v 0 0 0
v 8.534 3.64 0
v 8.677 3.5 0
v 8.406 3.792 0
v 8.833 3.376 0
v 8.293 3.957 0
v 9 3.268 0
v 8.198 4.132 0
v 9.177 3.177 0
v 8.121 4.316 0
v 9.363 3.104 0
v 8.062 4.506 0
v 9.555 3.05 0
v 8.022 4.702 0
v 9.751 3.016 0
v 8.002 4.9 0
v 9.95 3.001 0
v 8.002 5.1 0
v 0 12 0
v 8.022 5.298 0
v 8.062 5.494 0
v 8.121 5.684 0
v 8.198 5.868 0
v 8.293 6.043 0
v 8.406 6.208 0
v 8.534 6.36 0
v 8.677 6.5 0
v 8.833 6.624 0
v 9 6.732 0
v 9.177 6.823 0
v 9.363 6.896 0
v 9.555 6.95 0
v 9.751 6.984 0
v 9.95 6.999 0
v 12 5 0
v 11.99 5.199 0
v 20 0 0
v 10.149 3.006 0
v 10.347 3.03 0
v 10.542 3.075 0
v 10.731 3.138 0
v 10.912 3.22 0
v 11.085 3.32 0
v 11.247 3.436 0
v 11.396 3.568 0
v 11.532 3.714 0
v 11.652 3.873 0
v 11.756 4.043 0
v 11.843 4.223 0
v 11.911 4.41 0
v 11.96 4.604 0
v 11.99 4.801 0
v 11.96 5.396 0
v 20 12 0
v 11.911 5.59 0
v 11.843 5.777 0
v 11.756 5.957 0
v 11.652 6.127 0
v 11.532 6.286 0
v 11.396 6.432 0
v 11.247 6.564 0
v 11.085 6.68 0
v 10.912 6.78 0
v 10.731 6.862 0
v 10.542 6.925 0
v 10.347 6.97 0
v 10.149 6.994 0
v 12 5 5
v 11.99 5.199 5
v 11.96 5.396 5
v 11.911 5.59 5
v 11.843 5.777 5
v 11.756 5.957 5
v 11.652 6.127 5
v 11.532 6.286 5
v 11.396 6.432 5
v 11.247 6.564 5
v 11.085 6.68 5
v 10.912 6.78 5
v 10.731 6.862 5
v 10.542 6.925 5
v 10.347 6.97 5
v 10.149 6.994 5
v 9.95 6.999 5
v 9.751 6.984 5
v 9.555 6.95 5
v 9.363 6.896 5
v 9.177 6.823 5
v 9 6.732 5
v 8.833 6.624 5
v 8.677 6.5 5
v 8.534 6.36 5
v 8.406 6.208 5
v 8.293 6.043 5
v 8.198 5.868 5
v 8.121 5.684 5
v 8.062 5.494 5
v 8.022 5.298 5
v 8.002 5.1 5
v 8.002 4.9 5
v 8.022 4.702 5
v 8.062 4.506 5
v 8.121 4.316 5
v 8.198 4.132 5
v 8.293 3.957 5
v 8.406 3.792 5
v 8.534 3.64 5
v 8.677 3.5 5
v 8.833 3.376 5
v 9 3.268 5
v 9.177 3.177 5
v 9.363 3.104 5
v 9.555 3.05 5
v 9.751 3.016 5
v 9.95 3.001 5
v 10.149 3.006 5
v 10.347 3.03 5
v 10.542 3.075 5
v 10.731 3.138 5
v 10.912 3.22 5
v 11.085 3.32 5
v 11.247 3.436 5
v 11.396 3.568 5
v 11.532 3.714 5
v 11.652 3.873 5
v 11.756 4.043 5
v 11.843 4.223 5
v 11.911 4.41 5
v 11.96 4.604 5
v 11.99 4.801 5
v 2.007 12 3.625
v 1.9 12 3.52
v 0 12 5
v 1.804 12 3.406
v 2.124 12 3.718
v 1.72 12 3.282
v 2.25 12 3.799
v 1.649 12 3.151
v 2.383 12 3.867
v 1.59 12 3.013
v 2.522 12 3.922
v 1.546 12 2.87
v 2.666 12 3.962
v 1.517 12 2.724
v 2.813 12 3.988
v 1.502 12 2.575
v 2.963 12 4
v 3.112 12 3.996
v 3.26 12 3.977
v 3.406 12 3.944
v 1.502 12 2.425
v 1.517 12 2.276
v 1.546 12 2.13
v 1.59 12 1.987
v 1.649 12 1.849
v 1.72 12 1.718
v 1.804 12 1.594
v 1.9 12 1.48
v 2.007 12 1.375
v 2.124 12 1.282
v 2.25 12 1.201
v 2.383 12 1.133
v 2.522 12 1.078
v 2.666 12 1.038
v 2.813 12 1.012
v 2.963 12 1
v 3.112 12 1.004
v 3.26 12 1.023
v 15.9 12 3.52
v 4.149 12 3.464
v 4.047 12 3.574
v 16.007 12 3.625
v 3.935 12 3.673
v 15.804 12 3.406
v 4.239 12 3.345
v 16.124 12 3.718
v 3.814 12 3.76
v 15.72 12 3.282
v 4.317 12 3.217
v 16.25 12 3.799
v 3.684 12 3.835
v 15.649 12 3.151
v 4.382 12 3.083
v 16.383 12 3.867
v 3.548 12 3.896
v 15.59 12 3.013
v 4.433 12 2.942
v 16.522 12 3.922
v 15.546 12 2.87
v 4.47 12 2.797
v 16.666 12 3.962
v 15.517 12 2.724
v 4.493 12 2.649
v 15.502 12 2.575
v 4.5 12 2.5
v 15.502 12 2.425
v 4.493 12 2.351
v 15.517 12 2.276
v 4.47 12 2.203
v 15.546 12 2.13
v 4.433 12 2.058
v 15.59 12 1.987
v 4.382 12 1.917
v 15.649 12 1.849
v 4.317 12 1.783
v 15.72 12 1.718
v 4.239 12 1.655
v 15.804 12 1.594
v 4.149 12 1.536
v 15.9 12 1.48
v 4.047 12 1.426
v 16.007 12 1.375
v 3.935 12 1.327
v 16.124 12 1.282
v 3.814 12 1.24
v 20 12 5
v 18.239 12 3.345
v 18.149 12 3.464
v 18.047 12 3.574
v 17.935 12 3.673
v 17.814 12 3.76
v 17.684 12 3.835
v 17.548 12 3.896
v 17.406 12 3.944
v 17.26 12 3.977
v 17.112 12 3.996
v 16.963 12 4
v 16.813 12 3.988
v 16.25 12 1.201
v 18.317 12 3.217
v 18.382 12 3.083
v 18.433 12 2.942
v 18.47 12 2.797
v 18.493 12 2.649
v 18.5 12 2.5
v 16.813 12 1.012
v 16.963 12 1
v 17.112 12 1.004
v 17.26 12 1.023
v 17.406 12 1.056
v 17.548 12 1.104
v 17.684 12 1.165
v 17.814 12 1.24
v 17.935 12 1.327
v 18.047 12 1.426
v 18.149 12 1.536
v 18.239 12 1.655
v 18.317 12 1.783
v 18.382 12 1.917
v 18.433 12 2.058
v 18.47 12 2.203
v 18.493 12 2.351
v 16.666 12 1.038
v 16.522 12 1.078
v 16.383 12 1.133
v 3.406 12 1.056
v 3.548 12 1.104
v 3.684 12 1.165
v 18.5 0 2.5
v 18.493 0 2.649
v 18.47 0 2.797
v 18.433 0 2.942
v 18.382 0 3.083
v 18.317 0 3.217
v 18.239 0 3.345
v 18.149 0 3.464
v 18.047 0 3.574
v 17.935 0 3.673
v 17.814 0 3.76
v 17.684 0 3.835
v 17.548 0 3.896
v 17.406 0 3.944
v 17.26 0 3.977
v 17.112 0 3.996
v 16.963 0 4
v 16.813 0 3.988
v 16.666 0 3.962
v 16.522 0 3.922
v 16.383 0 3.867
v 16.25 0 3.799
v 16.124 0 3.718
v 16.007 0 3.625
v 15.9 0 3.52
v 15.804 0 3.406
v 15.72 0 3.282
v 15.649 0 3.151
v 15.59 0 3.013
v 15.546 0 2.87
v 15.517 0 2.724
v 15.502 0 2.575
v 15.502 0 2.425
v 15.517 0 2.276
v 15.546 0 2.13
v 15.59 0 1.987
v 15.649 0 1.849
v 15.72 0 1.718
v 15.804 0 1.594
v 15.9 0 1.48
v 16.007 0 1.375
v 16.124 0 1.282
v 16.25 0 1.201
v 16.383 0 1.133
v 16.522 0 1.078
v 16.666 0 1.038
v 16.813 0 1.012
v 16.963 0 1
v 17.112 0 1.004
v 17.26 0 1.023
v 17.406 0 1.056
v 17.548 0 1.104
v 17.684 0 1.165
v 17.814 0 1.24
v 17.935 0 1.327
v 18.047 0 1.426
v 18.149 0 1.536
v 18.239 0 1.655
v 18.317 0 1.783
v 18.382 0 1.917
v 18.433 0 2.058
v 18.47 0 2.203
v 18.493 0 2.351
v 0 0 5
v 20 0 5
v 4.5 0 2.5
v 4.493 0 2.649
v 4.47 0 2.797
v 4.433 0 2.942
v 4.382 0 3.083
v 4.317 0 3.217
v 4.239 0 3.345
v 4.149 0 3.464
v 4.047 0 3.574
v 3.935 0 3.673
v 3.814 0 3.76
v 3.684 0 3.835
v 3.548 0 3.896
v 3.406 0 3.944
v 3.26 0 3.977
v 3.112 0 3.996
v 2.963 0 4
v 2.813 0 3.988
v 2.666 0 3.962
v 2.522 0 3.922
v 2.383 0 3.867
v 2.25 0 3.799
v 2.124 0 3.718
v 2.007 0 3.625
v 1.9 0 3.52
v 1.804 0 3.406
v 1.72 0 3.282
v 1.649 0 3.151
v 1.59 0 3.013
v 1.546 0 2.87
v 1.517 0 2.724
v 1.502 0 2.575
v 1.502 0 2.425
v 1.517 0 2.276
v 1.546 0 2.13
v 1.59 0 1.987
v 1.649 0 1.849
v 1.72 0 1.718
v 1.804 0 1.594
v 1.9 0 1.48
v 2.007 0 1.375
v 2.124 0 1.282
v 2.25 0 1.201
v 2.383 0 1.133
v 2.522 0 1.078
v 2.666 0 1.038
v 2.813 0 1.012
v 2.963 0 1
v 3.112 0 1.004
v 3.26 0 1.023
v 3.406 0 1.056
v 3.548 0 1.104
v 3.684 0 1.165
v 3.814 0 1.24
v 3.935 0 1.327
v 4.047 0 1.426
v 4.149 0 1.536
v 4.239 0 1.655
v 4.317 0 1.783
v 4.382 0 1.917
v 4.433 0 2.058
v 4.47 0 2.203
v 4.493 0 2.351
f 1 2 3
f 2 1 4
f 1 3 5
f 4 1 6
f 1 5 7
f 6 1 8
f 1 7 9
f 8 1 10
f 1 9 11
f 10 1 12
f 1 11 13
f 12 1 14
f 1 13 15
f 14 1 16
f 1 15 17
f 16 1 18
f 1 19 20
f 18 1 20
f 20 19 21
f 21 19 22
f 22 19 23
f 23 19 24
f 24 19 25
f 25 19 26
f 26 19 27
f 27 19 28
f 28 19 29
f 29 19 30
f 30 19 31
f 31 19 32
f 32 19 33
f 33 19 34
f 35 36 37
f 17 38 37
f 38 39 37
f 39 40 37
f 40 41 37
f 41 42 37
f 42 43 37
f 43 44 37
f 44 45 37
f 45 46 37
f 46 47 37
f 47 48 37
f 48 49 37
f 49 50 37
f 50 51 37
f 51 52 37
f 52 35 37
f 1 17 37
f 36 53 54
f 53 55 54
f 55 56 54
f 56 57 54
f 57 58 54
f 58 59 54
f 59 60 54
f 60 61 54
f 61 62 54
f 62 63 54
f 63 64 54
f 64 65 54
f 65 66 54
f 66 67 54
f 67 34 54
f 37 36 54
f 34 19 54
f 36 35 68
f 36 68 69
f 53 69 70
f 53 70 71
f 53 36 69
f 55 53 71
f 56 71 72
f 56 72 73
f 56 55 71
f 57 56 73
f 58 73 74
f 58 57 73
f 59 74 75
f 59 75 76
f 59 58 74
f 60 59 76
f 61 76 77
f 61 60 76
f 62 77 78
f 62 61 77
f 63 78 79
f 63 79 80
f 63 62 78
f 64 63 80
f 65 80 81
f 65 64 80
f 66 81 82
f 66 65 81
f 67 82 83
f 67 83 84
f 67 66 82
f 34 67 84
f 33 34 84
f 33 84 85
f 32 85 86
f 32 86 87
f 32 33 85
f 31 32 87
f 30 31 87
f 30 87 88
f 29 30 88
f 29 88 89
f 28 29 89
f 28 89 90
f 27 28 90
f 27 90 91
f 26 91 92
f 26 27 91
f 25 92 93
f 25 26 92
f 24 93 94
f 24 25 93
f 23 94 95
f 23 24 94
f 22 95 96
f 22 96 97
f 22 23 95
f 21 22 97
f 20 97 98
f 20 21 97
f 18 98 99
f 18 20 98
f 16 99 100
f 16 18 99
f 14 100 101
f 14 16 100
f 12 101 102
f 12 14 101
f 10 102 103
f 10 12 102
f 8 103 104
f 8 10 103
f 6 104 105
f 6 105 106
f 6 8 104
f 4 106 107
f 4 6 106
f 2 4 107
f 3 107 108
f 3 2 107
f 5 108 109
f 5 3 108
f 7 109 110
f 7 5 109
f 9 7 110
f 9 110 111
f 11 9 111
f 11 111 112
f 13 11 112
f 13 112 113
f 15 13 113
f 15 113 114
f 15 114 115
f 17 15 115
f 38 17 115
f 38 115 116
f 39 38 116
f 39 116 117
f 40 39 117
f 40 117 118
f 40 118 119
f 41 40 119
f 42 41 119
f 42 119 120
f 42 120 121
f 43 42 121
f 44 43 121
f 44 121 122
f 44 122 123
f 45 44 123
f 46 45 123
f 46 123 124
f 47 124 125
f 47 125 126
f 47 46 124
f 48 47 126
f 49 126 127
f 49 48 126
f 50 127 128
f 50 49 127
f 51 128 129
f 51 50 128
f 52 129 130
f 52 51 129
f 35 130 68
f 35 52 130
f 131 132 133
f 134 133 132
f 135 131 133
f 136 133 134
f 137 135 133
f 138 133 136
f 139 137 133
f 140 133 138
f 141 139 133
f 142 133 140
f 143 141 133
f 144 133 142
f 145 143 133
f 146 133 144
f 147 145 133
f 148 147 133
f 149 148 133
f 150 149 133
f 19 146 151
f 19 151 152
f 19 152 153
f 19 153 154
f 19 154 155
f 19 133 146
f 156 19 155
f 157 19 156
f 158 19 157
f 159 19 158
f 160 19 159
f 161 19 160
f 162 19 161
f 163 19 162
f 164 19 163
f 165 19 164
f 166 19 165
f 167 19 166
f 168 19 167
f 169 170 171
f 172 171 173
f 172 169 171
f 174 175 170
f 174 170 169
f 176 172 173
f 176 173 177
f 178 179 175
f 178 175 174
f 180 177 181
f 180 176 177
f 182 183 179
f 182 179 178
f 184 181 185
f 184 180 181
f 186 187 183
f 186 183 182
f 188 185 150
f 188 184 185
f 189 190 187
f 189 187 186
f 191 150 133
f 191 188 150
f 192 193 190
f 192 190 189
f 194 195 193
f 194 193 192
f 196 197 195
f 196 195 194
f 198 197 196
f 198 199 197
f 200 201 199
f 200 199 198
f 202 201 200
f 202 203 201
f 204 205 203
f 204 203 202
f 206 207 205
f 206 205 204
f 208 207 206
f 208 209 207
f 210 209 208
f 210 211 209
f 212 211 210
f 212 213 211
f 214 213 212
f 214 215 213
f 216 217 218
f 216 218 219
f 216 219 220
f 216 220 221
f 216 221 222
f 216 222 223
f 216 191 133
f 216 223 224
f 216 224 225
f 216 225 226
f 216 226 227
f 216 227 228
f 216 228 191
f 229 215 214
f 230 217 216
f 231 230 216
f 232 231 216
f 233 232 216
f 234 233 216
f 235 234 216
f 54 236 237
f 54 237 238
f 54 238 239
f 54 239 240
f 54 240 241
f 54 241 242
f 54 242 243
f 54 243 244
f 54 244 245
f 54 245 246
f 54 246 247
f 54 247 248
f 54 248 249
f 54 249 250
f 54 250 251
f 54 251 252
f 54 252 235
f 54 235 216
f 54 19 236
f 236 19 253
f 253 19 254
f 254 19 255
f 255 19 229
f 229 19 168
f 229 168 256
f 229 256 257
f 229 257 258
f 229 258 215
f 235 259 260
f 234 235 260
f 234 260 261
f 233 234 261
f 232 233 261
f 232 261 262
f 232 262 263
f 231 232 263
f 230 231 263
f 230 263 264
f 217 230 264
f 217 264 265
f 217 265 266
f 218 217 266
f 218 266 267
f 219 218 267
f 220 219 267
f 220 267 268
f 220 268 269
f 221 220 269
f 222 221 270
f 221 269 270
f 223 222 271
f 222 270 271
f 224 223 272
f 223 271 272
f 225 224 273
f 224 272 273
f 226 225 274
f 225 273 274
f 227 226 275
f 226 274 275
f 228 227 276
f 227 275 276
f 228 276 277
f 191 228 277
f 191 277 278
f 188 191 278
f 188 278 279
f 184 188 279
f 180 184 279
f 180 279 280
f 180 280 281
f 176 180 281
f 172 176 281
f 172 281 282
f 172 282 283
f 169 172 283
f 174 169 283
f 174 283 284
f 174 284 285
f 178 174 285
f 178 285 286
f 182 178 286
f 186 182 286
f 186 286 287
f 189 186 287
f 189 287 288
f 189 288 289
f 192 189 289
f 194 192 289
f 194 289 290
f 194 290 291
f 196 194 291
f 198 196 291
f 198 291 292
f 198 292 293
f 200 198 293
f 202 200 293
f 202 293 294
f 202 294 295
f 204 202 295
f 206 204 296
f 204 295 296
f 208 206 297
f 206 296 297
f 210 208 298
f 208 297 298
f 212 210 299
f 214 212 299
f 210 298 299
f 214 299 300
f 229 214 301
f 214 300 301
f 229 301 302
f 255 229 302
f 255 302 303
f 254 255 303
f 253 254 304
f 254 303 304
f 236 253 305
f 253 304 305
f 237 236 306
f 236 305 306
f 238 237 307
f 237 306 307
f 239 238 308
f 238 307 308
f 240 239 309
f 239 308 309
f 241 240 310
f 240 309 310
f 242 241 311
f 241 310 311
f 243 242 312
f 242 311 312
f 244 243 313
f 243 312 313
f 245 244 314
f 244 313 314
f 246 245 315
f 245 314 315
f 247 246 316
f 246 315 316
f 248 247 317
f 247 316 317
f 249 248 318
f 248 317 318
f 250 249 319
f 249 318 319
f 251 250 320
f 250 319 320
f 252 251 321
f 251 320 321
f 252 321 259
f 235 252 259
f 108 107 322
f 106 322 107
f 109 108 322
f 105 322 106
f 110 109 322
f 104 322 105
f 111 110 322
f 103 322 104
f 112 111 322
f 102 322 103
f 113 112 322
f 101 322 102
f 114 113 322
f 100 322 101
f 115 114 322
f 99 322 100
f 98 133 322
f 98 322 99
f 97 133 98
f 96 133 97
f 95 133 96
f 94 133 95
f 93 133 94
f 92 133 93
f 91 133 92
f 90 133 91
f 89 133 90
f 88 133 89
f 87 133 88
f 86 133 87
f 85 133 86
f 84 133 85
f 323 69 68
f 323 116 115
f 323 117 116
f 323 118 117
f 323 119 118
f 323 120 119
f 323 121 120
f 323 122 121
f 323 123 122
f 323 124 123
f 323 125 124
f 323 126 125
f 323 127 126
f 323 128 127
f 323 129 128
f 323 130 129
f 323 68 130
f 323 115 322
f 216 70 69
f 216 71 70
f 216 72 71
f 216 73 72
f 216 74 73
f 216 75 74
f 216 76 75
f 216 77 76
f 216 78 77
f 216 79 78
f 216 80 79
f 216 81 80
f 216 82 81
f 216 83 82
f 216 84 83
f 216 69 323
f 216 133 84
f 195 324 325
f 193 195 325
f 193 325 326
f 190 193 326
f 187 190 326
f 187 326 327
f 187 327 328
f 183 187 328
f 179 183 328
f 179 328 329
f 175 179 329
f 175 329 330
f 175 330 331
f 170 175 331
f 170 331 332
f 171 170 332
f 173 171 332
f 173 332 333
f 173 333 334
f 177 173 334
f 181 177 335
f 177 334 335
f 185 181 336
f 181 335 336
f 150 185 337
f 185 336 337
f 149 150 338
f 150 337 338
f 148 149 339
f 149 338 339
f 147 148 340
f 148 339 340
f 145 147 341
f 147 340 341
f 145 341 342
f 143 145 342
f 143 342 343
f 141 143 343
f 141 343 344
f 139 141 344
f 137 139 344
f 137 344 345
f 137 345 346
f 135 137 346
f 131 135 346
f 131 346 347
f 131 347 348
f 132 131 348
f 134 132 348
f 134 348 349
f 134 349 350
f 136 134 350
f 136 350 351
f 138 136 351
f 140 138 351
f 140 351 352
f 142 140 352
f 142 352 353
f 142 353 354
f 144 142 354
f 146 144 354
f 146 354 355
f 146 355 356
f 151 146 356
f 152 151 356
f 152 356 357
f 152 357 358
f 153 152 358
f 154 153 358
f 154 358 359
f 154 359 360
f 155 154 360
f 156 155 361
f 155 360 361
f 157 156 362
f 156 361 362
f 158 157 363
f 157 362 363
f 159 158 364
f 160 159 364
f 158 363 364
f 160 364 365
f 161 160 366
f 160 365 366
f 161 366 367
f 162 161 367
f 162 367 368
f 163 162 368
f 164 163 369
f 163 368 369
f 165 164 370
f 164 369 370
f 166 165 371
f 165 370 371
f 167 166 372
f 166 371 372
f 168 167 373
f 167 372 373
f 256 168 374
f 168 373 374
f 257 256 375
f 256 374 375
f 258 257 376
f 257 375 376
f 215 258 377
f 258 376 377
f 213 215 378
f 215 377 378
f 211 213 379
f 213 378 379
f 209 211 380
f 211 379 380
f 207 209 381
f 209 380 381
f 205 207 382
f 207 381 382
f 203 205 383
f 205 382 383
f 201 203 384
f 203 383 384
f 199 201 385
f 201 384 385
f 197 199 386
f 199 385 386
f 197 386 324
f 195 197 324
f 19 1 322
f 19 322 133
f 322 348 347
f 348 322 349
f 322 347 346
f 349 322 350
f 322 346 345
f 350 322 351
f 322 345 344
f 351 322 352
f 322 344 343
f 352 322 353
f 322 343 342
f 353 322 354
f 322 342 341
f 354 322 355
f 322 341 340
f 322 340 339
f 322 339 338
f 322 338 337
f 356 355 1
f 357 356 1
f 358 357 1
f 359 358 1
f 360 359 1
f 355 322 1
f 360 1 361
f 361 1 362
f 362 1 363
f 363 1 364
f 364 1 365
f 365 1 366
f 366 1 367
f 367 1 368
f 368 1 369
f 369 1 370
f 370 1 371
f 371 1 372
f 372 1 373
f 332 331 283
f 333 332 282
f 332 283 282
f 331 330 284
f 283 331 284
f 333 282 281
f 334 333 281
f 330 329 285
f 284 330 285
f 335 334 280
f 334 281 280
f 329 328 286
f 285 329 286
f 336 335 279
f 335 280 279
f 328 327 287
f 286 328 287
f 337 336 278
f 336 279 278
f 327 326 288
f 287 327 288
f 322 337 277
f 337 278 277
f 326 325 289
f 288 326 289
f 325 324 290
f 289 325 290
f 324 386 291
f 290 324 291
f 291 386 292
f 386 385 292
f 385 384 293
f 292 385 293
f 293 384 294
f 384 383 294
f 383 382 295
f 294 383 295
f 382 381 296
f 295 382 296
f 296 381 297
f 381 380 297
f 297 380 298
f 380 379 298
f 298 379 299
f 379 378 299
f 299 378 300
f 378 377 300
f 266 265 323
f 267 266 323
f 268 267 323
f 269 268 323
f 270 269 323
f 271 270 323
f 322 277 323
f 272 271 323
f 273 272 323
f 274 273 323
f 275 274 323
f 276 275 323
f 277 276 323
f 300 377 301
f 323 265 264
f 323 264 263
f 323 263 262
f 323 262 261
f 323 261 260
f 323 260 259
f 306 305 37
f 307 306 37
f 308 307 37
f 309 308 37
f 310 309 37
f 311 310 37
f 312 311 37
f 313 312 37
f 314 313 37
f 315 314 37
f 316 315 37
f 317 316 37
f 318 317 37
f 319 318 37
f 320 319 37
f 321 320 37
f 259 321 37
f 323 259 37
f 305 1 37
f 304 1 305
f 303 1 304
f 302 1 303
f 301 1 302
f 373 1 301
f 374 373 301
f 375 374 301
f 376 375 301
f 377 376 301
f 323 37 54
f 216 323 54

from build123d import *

# Parameters (mm, degrees)
SKETCH_W     = 20
SKETCH_H     = 12
SKETCH_R     = 2
PAD_DEPTH    = 5
SKETCH001_R  = 1.5
POCKET_DEPTH = 12.001


with BuildPart() as part:
    # Sketch → Pad (new body)
    with BuildSketch(Plane.XY):
        with Locations((10, 6)):
            Rectangle(SKETCH_W, SKETCH_H)
        with Locations((10, 5)):
            Circle(SKETCH_R, mode=Mode.SUBTRACT)
    extrude(amount=PAD_DEPTH)

    # Sketch001 → Pocket (cut, through all)
    with BuildSketch(Plane.XZ):
        with Locations((3, 2.5)):
            Circle(SKETCH001_R)
        with Locations((17, 2.5)):
            Circle(SKETCH001_R)
    extrude(amount=-POCKET_DEPTH, mode=Mode.SUBTRACT)


solid = part.part
